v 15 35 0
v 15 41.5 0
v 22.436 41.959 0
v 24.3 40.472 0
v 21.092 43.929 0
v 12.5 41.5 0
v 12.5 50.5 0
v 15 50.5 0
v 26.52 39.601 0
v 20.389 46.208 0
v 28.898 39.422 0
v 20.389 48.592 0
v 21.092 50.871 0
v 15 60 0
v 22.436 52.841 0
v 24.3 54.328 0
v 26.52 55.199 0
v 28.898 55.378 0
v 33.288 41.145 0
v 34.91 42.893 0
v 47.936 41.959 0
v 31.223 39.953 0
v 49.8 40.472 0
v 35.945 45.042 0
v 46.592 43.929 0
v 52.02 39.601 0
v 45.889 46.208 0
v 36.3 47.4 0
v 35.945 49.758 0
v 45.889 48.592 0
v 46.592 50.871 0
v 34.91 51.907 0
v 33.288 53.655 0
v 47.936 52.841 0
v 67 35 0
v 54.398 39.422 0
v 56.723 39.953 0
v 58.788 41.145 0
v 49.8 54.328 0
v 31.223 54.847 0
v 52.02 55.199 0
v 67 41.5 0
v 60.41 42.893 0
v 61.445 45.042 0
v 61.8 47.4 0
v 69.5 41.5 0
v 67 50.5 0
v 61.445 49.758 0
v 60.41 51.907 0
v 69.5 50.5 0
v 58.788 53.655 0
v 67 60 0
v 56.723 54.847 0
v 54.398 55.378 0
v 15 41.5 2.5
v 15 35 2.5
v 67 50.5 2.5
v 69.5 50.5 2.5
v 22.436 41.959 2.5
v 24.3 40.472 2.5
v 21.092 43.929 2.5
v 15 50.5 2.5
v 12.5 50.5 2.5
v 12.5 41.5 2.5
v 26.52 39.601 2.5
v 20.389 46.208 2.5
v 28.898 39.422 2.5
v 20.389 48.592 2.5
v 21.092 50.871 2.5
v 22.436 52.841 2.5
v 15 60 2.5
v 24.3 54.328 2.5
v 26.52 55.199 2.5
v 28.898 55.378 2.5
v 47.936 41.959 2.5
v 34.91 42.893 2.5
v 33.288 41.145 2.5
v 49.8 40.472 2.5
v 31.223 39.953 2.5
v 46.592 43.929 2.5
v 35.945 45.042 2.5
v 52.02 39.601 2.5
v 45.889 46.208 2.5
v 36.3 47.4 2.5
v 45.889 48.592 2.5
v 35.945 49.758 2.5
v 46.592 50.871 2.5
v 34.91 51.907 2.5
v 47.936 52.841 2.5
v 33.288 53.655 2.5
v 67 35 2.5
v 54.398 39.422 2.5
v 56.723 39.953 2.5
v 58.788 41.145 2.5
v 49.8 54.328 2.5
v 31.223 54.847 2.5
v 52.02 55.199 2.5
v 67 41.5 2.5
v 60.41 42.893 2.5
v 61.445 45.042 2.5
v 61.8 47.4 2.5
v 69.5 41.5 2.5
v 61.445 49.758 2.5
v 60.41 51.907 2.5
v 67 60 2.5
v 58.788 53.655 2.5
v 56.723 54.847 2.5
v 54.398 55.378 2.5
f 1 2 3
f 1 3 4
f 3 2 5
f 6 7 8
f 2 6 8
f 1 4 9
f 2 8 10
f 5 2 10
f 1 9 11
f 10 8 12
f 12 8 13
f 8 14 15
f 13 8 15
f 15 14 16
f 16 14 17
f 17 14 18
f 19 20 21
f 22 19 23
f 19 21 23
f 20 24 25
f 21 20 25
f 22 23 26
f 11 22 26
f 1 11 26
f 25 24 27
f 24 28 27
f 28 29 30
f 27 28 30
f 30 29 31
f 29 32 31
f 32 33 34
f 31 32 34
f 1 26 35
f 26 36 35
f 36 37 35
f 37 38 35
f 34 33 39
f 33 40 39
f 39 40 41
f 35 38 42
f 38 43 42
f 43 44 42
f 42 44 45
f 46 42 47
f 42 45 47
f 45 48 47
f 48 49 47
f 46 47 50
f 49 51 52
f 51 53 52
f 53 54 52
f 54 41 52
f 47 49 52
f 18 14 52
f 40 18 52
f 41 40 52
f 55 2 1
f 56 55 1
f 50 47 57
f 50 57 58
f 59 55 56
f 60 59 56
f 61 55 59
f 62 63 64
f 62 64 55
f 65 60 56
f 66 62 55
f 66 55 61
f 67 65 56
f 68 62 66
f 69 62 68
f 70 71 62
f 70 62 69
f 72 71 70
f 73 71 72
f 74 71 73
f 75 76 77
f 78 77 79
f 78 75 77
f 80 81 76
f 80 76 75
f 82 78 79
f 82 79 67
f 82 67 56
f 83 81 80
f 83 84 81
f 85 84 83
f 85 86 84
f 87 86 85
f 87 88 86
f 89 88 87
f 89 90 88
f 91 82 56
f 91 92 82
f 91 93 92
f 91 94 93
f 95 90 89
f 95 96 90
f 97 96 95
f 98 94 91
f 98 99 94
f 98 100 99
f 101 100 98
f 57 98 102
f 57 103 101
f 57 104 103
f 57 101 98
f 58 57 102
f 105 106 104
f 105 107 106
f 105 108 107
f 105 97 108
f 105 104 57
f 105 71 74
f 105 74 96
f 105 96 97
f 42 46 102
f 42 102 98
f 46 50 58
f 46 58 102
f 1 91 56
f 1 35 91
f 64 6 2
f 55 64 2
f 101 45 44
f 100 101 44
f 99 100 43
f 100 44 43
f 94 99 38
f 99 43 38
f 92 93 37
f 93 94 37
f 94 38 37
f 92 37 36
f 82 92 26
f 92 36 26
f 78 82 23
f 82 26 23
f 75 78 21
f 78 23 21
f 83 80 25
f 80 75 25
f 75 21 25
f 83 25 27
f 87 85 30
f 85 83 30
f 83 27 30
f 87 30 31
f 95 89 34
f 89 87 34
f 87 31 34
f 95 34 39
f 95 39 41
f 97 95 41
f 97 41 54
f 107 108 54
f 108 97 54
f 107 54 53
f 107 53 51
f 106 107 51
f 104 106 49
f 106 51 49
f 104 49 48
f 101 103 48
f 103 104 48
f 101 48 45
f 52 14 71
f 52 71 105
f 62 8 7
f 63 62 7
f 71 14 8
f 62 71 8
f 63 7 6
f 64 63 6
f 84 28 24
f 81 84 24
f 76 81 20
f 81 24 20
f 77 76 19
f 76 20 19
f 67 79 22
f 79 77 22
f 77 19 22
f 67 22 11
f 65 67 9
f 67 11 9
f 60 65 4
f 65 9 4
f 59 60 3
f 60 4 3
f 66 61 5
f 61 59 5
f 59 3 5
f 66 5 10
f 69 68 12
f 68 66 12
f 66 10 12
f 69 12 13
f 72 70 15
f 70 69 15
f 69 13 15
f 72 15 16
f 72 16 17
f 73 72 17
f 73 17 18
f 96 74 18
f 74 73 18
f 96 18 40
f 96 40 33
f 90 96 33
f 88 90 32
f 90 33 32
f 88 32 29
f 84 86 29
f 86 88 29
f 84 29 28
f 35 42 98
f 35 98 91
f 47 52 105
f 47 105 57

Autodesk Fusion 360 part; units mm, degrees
sketch "Sketch1" plane through (0, 0, 0) normal (0, 0, 1) x (1, 0, 0)
  line L0 (15, 60) -> (67, 60)
  line L1 (67, 60) -> (67, 50.5)
  line L2 (15, 60) -> (15, 50.5)
  line L3 (67, 50.5) -> (69.5, 50.5)
  line L4 (15, 50.5) -> (12.5, 50.5)
  line L5 (69.5, 50.5) -> (69.5, 41.5)
  line L6 (12.5, 50.5) -> (12.5, 41.5)
  line L7 (69.5, 41.5) -> (67, 41.5)
  line L8 (12.5, 41.5) -> (15, 41.5)
  line L9 (67, 41.5) -> (67, 35)
  line L10 (15, 41.5) -> (15, 35)
  line L11 (67, 35) -> (15, 35)
  line L12 (15, 35) -> (15, 29) construction
  circle A0 centre (28.3, 47.4) radius 8
  line L13 (28.3, 47.4) -> (53.8, 47.4) construction
  circle A1 centre (53.8, 47.4) radius 8
  dimension "d1" = 52
  dimension "d2" = 9.5
  dimension "d3" = 9.5
  dimension "d4" = 2.5
  dimension "d5" = 2.5
  dimension "d6" = 9
  dimension "d7" = 9
  dimension "d8" = 2.5
  dimension "d9" = 2.5
  dimension "d10" = 6.5
  dimension "d11" = 6.5
  dimension "d12" = 16
  dimension "d13" = 12.4
  dimension "d14" = 15.8
  dimension "d15" = 25.5
  dimension "d16" = 16
extrude "Extrude1" add sketch "Sketch1" along normal blind 2.5
